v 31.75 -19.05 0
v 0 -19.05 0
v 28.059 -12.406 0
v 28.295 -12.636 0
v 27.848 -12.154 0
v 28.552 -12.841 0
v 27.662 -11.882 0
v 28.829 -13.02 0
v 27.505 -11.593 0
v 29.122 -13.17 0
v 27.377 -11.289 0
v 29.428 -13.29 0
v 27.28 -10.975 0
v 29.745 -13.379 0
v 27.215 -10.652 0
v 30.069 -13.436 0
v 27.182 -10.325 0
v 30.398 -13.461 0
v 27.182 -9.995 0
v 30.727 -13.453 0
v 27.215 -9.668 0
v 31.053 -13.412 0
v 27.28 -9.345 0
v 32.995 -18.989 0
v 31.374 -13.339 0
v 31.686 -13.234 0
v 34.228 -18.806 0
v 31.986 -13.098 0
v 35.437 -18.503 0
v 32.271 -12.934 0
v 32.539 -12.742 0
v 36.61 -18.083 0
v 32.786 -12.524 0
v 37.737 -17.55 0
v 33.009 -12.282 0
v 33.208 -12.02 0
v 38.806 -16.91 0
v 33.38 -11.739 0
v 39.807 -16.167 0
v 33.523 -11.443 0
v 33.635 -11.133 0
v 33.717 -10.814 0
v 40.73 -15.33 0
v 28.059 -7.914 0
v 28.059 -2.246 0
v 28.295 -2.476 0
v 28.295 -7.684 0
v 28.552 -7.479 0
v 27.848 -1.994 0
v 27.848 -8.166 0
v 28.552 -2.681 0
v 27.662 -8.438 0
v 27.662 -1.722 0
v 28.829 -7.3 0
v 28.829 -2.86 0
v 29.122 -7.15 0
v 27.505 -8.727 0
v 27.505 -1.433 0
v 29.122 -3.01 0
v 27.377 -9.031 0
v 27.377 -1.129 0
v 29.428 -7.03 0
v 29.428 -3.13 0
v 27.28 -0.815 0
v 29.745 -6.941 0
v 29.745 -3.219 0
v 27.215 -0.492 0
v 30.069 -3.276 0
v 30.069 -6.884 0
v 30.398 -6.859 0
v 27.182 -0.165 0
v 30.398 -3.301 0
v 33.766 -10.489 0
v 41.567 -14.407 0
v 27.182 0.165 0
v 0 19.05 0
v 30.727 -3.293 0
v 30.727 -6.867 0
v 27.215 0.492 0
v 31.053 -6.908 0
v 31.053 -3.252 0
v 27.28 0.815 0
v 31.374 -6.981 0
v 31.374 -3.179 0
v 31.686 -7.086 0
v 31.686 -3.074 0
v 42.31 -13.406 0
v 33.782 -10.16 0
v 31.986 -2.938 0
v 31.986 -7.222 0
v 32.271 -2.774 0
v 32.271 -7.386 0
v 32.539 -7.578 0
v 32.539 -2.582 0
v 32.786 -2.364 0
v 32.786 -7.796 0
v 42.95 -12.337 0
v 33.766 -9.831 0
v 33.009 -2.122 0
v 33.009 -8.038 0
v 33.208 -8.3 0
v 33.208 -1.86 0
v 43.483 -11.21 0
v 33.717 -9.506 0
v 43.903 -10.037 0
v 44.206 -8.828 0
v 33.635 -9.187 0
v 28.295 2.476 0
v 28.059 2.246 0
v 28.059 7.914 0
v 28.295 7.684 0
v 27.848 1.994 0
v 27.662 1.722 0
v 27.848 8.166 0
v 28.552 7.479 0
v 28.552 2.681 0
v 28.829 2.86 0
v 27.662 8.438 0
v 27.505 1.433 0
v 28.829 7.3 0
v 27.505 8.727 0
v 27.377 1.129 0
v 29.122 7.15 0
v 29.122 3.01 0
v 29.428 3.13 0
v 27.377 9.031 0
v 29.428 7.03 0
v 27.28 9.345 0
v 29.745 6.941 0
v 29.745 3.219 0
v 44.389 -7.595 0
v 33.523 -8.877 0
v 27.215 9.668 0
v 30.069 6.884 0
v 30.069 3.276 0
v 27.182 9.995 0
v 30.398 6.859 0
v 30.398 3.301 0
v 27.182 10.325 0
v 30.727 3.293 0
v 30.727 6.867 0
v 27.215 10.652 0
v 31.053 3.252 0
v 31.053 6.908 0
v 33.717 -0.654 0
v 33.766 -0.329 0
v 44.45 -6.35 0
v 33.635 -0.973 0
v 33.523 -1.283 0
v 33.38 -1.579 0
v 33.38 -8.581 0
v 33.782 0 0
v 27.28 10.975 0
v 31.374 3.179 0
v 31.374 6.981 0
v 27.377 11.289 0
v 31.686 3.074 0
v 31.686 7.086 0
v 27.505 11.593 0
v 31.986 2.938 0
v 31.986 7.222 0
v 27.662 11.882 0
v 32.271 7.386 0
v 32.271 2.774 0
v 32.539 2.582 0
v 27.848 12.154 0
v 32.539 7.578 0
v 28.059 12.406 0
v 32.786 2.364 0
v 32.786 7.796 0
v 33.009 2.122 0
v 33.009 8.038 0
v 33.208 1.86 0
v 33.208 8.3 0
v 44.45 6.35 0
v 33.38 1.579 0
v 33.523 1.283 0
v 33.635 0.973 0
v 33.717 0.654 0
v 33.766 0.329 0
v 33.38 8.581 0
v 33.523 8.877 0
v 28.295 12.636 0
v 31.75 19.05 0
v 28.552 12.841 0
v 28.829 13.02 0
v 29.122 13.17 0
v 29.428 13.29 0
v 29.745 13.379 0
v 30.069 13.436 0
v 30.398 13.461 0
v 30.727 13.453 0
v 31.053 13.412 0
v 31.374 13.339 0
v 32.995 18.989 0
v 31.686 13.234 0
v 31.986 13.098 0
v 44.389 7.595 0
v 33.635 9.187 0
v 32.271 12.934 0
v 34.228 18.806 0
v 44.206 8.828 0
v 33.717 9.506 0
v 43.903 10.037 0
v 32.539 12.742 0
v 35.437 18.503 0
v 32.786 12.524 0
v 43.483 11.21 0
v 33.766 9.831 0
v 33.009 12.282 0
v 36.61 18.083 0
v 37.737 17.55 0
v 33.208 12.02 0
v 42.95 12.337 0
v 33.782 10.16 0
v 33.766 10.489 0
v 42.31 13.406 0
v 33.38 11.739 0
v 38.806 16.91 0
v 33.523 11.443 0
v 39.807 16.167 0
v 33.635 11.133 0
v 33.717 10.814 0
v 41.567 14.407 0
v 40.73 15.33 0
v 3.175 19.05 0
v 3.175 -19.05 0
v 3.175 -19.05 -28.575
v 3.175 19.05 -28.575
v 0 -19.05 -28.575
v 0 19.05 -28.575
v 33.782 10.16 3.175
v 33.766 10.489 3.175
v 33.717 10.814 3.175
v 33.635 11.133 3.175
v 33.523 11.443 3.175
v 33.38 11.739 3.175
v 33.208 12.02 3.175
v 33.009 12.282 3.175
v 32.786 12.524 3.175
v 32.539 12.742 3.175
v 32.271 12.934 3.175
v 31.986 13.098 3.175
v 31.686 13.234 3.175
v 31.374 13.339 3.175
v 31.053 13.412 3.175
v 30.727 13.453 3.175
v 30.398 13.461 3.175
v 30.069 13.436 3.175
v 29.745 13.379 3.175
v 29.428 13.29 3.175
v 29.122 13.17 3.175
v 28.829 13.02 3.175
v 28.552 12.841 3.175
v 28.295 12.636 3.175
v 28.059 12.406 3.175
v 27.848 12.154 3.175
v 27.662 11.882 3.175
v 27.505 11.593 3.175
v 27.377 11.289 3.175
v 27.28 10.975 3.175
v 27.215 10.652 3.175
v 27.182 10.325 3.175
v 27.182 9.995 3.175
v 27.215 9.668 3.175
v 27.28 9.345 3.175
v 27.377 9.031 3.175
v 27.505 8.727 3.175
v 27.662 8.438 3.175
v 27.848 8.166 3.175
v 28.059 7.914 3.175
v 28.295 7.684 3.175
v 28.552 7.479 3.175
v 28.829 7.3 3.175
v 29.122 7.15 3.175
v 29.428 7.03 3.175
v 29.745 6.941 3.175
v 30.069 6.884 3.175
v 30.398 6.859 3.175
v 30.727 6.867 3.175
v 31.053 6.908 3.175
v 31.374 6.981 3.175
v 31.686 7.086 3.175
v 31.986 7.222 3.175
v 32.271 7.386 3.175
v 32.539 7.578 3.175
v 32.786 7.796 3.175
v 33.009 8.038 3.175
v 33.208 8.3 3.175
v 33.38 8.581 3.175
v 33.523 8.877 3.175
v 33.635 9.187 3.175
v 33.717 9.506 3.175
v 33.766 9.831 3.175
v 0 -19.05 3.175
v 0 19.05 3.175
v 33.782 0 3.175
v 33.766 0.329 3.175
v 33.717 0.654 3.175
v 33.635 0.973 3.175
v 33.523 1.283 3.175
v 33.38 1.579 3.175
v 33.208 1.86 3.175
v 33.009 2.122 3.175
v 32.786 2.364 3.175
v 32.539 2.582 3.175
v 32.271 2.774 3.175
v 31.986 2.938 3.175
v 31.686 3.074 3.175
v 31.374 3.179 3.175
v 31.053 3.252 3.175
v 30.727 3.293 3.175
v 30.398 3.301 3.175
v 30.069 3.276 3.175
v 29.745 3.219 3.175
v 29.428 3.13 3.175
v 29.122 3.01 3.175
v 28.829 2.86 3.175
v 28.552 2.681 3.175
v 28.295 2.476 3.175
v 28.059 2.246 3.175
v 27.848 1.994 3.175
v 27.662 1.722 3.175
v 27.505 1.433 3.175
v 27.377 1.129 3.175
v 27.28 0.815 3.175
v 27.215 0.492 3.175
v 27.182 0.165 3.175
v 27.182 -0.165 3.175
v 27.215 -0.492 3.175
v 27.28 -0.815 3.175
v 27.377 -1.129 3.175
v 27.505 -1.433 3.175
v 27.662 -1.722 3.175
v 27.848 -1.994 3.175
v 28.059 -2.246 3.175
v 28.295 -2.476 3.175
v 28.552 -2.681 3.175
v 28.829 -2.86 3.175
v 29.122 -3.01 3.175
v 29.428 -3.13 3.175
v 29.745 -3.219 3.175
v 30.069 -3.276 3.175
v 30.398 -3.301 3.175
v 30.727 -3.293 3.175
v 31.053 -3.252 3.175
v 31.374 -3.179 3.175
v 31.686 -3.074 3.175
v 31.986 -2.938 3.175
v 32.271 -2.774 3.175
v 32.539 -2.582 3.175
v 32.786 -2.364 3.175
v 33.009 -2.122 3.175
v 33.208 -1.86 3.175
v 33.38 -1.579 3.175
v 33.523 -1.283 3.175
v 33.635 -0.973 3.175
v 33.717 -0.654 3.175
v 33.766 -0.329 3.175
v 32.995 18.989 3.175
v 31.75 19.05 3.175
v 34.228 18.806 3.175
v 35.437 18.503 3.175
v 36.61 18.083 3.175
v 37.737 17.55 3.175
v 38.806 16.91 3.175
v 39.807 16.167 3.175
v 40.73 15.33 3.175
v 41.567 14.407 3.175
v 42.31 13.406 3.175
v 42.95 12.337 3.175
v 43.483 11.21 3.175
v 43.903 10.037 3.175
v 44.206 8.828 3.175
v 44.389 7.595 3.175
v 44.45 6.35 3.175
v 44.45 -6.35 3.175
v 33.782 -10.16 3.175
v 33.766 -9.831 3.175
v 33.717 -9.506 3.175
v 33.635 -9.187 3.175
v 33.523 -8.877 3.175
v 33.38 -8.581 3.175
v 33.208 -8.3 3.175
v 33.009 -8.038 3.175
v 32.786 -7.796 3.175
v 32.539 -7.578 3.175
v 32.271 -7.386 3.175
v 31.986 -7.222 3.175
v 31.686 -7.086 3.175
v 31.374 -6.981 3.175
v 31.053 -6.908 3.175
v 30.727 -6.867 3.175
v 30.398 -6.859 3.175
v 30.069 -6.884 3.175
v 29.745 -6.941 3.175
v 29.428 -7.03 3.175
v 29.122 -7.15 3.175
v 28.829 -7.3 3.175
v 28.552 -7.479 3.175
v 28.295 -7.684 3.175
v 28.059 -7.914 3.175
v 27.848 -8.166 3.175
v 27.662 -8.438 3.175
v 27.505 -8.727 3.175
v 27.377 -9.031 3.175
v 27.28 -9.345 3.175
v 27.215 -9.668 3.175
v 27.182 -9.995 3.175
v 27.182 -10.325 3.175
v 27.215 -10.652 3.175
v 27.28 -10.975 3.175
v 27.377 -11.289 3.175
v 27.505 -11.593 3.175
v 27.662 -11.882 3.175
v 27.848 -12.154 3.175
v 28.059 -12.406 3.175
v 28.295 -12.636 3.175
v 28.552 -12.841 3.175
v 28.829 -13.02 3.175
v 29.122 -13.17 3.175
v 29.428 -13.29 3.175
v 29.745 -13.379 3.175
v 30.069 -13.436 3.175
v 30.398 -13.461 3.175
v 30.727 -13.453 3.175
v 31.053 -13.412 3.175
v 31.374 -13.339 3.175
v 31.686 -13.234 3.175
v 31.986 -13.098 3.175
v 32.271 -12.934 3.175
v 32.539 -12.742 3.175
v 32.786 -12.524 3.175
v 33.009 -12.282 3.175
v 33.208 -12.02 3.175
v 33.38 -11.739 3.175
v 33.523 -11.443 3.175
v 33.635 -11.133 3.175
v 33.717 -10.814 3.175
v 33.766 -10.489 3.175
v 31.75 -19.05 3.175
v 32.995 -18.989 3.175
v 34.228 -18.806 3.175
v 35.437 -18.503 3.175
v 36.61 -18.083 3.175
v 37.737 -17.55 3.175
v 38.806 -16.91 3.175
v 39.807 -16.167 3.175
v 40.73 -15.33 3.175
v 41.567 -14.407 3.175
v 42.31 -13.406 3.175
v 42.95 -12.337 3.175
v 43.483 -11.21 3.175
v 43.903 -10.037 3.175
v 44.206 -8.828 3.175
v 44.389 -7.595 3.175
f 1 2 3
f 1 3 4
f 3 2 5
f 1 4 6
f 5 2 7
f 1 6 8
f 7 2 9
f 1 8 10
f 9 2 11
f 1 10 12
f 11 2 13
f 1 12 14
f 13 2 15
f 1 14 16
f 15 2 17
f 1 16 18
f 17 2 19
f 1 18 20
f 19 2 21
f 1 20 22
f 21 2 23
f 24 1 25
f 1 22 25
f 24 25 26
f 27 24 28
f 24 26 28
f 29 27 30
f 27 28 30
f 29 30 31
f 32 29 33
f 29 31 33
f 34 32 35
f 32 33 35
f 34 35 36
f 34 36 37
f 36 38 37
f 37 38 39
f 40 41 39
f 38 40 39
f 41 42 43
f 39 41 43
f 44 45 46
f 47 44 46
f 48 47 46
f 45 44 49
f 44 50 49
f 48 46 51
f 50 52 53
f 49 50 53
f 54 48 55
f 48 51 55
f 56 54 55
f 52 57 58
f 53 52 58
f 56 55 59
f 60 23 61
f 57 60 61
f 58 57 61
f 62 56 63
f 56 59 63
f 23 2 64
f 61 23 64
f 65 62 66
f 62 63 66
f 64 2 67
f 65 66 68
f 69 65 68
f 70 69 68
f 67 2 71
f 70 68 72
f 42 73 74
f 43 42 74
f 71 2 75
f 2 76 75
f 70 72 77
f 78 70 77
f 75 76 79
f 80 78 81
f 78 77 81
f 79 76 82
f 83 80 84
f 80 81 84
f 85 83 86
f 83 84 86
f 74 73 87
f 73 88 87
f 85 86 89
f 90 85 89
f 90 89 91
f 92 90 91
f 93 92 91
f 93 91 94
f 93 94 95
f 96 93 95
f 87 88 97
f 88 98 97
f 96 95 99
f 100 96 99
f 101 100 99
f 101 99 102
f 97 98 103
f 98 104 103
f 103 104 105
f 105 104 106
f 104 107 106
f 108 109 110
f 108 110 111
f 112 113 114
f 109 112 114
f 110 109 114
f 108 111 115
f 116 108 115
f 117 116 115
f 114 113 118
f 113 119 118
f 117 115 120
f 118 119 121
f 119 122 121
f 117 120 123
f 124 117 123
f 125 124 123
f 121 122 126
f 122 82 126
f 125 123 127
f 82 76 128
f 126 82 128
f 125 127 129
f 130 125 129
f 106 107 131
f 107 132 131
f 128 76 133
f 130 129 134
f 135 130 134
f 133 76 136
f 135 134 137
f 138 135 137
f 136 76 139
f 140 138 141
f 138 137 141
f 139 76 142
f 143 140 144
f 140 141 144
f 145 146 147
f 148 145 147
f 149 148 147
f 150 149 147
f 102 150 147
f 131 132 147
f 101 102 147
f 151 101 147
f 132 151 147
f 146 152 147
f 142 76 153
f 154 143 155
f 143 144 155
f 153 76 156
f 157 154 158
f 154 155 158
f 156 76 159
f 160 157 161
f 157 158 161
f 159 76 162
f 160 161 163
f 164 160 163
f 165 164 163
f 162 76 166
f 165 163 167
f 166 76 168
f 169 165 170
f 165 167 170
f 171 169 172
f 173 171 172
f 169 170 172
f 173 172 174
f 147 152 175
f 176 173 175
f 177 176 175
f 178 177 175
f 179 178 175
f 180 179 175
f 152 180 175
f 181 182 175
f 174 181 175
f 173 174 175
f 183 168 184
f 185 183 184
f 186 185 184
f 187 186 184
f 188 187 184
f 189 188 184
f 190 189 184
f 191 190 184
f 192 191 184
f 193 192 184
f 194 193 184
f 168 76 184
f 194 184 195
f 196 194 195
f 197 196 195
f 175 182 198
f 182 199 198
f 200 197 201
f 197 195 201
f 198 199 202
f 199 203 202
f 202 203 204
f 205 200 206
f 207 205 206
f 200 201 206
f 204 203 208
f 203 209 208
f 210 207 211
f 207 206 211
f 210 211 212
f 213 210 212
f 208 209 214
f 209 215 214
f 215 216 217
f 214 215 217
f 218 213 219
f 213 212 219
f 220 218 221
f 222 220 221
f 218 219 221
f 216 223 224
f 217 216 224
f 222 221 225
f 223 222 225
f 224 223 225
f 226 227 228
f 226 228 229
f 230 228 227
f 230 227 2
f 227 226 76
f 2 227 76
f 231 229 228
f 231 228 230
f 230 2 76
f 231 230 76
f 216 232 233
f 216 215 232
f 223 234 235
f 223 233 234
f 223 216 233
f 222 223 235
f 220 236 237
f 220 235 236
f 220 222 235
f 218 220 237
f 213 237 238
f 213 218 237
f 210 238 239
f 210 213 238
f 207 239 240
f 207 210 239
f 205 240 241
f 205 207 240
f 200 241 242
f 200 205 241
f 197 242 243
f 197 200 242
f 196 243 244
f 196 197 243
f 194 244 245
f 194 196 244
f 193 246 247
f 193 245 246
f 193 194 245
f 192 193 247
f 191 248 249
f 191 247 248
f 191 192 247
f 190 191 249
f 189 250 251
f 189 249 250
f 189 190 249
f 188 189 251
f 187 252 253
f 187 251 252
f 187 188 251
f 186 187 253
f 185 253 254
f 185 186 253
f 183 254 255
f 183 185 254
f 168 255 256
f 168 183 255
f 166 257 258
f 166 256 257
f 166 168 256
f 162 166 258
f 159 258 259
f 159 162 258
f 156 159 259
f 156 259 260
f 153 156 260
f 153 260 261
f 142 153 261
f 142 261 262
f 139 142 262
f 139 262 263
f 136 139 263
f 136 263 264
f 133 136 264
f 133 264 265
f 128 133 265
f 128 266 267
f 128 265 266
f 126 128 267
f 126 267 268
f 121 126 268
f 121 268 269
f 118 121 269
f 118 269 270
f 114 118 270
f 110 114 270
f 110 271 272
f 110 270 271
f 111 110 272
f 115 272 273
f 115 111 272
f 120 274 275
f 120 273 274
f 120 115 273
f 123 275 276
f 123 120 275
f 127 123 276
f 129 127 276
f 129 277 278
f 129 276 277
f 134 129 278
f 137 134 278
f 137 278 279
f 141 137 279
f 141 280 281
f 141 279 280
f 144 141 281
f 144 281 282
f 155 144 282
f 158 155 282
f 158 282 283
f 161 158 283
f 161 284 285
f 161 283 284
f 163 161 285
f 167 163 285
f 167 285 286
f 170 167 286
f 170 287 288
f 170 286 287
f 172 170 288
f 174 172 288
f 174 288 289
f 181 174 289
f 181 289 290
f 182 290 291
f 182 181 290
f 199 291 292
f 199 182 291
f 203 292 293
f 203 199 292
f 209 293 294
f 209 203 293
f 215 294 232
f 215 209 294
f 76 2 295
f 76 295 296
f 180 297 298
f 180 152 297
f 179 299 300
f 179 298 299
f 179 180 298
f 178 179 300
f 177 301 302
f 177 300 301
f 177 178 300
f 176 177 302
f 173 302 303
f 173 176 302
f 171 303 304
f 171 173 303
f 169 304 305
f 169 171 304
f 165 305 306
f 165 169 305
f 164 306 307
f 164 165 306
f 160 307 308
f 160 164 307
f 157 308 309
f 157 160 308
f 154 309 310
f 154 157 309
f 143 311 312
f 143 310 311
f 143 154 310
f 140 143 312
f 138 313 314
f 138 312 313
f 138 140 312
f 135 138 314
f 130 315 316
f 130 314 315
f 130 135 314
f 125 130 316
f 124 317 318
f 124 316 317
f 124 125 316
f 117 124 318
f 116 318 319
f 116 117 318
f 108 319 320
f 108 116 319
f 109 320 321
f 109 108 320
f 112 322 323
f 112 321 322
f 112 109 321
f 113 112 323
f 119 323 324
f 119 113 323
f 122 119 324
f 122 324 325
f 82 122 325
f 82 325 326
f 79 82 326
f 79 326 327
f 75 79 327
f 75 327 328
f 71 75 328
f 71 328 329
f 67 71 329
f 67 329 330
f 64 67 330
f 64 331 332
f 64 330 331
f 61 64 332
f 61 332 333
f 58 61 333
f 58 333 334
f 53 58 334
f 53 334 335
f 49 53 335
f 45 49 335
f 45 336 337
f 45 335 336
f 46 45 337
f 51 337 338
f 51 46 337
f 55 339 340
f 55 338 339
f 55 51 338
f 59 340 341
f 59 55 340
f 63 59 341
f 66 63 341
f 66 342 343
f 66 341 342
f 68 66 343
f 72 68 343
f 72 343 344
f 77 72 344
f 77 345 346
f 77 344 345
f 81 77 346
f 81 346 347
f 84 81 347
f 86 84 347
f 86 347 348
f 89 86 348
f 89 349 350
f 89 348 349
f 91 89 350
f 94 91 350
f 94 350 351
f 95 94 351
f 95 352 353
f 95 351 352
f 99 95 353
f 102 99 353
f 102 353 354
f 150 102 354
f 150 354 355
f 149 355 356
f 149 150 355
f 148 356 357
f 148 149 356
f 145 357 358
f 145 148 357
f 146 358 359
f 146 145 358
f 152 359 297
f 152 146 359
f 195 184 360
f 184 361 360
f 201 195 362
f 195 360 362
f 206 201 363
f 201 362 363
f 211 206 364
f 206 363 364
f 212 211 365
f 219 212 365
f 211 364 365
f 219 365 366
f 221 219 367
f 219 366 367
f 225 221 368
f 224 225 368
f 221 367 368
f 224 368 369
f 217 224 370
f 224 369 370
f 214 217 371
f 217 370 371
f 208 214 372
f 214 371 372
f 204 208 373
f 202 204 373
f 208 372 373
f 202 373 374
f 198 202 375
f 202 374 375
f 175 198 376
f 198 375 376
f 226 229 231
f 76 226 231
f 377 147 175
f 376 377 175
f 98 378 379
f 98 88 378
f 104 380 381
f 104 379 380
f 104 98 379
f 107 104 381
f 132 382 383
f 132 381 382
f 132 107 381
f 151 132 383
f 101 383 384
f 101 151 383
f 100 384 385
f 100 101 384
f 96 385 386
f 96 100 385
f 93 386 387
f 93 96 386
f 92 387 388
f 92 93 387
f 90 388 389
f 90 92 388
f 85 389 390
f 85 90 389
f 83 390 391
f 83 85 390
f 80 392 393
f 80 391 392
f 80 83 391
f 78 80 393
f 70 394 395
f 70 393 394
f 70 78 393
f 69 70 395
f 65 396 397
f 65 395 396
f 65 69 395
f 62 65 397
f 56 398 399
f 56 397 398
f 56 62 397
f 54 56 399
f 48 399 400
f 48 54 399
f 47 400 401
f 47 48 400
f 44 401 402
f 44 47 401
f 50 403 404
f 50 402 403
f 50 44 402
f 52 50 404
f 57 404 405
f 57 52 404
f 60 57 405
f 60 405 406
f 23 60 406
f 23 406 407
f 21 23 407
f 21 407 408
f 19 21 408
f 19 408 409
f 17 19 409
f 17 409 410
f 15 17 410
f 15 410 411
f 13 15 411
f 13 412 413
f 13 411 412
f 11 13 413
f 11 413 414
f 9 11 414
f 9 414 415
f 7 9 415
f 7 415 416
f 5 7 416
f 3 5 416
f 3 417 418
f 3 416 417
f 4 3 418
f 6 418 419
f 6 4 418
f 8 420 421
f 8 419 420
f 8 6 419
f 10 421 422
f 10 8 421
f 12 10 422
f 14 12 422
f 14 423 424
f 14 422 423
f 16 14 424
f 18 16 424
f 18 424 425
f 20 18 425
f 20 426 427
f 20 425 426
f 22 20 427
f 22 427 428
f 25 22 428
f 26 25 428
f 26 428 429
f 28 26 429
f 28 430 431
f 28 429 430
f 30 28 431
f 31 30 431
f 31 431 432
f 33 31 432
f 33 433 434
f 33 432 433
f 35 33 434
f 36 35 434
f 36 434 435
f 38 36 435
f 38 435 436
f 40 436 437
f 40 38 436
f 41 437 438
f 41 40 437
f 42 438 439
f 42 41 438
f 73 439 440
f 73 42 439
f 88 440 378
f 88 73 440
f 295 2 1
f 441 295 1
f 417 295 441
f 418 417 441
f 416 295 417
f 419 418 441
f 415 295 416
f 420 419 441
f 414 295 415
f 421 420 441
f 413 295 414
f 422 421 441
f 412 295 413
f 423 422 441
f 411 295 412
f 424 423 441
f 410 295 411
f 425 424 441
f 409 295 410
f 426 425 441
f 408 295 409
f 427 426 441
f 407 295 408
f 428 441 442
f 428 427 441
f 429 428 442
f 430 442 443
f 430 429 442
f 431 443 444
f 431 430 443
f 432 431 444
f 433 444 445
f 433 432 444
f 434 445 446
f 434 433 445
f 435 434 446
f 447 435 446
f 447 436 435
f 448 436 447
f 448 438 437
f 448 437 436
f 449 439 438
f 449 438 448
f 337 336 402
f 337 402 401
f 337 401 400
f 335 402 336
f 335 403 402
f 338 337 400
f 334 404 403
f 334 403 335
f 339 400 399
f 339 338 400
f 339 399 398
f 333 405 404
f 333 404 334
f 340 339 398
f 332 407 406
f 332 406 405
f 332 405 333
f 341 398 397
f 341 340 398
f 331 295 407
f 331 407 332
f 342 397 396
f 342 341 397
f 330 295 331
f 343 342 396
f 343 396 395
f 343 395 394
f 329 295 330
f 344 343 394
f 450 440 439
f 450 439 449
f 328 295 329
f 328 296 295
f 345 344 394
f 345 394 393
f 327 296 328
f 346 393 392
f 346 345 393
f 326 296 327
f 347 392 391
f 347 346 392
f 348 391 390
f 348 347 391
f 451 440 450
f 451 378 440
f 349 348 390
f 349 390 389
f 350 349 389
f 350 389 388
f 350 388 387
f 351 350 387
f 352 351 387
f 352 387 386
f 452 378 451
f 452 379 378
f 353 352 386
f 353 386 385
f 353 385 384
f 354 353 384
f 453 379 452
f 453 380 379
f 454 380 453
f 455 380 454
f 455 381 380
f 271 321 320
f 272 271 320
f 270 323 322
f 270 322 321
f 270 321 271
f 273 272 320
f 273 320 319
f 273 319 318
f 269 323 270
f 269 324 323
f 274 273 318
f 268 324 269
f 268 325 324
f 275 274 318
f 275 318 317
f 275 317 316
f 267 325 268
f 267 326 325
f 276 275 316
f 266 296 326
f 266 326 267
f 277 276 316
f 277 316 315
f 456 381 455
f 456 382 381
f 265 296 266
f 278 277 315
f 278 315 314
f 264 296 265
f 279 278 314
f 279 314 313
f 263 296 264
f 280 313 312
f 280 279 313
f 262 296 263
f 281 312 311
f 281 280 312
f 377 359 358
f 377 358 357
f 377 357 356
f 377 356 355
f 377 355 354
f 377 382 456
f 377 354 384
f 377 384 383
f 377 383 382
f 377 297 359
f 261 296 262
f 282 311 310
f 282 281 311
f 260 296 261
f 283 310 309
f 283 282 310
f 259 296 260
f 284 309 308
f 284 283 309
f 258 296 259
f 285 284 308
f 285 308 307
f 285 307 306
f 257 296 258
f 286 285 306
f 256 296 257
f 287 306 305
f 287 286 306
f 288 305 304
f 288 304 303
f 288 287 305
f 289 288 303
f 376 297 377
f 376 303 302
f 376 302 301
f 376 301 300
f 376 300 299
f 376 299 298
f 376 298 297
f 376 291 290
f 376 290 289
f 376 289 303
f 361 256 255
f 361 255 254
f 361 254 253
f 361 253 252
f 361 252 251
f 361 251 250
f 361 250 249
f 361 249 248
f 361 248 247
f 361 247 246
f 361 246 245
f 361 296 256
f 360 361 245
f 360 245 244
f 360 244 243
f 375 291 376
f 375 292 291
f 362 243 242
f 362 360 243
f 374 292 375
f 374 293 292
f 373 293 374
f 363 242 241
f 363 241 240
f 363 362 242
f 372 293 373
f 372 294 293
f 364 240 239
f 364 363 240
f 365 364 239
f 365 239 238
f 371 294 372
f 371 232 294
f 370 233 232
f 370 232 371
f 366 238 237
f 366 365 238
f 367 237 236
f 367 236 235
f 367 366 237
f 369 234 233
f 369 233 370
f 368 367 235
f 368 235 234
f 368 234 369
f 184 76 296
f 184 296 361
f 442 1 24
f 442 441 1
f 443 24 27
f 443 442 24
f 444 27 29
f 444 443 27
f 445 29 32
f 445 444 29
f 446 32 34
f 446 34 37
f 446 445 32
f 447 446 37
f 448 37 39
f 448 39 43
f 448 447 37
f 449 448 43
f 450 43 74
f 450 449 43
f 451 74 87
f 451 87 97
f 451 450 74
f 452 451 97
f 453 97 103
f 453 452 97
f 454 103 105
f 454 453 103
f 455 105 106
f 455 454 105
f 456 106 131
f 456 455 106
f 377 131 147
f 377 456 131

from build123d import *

# Parameters (mm, degrees)
SKETCH1_W               = 44.45
SKETCH1_H               = 38.1
BOSS_EXTRUDE1_DEPTH     = 3.175
CUT_EXTRUDE1_DEPTH      = 49.464271634
CUT_EXTRUDE1_DEPTH_BACK = 49.464271634
SKETCH2_R               = 3.302
SKETCH3_W               = 3.175
SKETCH3_H               = 38.1
BOSS_EXTRUDE2_DEPTH     = 28.575
FILLET1_R               = 12.7


with BuildPart() as part:
    # Sketch1 → Boss-Extrude1 (new body)
    with BuildSketch(Plane.XY):
        with Locations((22.225, 0)):
            Rectangle(SKETCH1_W, SKETCH1_H)
    extrude(amount=BOSS_EXTRUDE1_DEPTH)

    # Sketch2 → Cut-Extrude1 (cut, two sides: drawn at the far end of the back side and taken through both)
    with BuildSketch(Plane.XY.offset(3.175).offset(-CUT_EXTRUDE1_DEPTH_BACK)):
        with Locations((30.48, 10.16)):
            Circle(SKETCH2_R)
        with Locations((30.48, -10.16)):
            Circle(SKETCH2_R)
        with Locations((30.48, 0)):
            Circle(SKETCH2_R)
    extrude(amount=CUT_EXTRUDE1_DEPTH + CUT_EXTRUDE1_DEPTH_BACK, mode=Mode.SUBTRACT)

    # Fillet1
    fillet1_edges = [part.edges().sort_by_distance(p)[0] for p in [
        (44.45, 19.05, 1.5875),
        (44.45, -19.05, 1.5875),
    ]]
    fillet(fillet1_edges, radius=FILLET1_R)


with BuildPart() as body_2:
    # Sketch3 → Boss-Extrude2 (new body)
    with BuildSketch(Plane(origin=(0, 0, 0), x_dir=(-1, 0, 0), z_dir=(0, 0, -1))):
        with Locations((-1.5875, 0)):
            Rectangle(SKETCH3_W, SKETCH3_H)
    extrude(amount=BOSS_EXTRUDE2_DEPTH)


solid = Compound([part.part, body_2.part])
